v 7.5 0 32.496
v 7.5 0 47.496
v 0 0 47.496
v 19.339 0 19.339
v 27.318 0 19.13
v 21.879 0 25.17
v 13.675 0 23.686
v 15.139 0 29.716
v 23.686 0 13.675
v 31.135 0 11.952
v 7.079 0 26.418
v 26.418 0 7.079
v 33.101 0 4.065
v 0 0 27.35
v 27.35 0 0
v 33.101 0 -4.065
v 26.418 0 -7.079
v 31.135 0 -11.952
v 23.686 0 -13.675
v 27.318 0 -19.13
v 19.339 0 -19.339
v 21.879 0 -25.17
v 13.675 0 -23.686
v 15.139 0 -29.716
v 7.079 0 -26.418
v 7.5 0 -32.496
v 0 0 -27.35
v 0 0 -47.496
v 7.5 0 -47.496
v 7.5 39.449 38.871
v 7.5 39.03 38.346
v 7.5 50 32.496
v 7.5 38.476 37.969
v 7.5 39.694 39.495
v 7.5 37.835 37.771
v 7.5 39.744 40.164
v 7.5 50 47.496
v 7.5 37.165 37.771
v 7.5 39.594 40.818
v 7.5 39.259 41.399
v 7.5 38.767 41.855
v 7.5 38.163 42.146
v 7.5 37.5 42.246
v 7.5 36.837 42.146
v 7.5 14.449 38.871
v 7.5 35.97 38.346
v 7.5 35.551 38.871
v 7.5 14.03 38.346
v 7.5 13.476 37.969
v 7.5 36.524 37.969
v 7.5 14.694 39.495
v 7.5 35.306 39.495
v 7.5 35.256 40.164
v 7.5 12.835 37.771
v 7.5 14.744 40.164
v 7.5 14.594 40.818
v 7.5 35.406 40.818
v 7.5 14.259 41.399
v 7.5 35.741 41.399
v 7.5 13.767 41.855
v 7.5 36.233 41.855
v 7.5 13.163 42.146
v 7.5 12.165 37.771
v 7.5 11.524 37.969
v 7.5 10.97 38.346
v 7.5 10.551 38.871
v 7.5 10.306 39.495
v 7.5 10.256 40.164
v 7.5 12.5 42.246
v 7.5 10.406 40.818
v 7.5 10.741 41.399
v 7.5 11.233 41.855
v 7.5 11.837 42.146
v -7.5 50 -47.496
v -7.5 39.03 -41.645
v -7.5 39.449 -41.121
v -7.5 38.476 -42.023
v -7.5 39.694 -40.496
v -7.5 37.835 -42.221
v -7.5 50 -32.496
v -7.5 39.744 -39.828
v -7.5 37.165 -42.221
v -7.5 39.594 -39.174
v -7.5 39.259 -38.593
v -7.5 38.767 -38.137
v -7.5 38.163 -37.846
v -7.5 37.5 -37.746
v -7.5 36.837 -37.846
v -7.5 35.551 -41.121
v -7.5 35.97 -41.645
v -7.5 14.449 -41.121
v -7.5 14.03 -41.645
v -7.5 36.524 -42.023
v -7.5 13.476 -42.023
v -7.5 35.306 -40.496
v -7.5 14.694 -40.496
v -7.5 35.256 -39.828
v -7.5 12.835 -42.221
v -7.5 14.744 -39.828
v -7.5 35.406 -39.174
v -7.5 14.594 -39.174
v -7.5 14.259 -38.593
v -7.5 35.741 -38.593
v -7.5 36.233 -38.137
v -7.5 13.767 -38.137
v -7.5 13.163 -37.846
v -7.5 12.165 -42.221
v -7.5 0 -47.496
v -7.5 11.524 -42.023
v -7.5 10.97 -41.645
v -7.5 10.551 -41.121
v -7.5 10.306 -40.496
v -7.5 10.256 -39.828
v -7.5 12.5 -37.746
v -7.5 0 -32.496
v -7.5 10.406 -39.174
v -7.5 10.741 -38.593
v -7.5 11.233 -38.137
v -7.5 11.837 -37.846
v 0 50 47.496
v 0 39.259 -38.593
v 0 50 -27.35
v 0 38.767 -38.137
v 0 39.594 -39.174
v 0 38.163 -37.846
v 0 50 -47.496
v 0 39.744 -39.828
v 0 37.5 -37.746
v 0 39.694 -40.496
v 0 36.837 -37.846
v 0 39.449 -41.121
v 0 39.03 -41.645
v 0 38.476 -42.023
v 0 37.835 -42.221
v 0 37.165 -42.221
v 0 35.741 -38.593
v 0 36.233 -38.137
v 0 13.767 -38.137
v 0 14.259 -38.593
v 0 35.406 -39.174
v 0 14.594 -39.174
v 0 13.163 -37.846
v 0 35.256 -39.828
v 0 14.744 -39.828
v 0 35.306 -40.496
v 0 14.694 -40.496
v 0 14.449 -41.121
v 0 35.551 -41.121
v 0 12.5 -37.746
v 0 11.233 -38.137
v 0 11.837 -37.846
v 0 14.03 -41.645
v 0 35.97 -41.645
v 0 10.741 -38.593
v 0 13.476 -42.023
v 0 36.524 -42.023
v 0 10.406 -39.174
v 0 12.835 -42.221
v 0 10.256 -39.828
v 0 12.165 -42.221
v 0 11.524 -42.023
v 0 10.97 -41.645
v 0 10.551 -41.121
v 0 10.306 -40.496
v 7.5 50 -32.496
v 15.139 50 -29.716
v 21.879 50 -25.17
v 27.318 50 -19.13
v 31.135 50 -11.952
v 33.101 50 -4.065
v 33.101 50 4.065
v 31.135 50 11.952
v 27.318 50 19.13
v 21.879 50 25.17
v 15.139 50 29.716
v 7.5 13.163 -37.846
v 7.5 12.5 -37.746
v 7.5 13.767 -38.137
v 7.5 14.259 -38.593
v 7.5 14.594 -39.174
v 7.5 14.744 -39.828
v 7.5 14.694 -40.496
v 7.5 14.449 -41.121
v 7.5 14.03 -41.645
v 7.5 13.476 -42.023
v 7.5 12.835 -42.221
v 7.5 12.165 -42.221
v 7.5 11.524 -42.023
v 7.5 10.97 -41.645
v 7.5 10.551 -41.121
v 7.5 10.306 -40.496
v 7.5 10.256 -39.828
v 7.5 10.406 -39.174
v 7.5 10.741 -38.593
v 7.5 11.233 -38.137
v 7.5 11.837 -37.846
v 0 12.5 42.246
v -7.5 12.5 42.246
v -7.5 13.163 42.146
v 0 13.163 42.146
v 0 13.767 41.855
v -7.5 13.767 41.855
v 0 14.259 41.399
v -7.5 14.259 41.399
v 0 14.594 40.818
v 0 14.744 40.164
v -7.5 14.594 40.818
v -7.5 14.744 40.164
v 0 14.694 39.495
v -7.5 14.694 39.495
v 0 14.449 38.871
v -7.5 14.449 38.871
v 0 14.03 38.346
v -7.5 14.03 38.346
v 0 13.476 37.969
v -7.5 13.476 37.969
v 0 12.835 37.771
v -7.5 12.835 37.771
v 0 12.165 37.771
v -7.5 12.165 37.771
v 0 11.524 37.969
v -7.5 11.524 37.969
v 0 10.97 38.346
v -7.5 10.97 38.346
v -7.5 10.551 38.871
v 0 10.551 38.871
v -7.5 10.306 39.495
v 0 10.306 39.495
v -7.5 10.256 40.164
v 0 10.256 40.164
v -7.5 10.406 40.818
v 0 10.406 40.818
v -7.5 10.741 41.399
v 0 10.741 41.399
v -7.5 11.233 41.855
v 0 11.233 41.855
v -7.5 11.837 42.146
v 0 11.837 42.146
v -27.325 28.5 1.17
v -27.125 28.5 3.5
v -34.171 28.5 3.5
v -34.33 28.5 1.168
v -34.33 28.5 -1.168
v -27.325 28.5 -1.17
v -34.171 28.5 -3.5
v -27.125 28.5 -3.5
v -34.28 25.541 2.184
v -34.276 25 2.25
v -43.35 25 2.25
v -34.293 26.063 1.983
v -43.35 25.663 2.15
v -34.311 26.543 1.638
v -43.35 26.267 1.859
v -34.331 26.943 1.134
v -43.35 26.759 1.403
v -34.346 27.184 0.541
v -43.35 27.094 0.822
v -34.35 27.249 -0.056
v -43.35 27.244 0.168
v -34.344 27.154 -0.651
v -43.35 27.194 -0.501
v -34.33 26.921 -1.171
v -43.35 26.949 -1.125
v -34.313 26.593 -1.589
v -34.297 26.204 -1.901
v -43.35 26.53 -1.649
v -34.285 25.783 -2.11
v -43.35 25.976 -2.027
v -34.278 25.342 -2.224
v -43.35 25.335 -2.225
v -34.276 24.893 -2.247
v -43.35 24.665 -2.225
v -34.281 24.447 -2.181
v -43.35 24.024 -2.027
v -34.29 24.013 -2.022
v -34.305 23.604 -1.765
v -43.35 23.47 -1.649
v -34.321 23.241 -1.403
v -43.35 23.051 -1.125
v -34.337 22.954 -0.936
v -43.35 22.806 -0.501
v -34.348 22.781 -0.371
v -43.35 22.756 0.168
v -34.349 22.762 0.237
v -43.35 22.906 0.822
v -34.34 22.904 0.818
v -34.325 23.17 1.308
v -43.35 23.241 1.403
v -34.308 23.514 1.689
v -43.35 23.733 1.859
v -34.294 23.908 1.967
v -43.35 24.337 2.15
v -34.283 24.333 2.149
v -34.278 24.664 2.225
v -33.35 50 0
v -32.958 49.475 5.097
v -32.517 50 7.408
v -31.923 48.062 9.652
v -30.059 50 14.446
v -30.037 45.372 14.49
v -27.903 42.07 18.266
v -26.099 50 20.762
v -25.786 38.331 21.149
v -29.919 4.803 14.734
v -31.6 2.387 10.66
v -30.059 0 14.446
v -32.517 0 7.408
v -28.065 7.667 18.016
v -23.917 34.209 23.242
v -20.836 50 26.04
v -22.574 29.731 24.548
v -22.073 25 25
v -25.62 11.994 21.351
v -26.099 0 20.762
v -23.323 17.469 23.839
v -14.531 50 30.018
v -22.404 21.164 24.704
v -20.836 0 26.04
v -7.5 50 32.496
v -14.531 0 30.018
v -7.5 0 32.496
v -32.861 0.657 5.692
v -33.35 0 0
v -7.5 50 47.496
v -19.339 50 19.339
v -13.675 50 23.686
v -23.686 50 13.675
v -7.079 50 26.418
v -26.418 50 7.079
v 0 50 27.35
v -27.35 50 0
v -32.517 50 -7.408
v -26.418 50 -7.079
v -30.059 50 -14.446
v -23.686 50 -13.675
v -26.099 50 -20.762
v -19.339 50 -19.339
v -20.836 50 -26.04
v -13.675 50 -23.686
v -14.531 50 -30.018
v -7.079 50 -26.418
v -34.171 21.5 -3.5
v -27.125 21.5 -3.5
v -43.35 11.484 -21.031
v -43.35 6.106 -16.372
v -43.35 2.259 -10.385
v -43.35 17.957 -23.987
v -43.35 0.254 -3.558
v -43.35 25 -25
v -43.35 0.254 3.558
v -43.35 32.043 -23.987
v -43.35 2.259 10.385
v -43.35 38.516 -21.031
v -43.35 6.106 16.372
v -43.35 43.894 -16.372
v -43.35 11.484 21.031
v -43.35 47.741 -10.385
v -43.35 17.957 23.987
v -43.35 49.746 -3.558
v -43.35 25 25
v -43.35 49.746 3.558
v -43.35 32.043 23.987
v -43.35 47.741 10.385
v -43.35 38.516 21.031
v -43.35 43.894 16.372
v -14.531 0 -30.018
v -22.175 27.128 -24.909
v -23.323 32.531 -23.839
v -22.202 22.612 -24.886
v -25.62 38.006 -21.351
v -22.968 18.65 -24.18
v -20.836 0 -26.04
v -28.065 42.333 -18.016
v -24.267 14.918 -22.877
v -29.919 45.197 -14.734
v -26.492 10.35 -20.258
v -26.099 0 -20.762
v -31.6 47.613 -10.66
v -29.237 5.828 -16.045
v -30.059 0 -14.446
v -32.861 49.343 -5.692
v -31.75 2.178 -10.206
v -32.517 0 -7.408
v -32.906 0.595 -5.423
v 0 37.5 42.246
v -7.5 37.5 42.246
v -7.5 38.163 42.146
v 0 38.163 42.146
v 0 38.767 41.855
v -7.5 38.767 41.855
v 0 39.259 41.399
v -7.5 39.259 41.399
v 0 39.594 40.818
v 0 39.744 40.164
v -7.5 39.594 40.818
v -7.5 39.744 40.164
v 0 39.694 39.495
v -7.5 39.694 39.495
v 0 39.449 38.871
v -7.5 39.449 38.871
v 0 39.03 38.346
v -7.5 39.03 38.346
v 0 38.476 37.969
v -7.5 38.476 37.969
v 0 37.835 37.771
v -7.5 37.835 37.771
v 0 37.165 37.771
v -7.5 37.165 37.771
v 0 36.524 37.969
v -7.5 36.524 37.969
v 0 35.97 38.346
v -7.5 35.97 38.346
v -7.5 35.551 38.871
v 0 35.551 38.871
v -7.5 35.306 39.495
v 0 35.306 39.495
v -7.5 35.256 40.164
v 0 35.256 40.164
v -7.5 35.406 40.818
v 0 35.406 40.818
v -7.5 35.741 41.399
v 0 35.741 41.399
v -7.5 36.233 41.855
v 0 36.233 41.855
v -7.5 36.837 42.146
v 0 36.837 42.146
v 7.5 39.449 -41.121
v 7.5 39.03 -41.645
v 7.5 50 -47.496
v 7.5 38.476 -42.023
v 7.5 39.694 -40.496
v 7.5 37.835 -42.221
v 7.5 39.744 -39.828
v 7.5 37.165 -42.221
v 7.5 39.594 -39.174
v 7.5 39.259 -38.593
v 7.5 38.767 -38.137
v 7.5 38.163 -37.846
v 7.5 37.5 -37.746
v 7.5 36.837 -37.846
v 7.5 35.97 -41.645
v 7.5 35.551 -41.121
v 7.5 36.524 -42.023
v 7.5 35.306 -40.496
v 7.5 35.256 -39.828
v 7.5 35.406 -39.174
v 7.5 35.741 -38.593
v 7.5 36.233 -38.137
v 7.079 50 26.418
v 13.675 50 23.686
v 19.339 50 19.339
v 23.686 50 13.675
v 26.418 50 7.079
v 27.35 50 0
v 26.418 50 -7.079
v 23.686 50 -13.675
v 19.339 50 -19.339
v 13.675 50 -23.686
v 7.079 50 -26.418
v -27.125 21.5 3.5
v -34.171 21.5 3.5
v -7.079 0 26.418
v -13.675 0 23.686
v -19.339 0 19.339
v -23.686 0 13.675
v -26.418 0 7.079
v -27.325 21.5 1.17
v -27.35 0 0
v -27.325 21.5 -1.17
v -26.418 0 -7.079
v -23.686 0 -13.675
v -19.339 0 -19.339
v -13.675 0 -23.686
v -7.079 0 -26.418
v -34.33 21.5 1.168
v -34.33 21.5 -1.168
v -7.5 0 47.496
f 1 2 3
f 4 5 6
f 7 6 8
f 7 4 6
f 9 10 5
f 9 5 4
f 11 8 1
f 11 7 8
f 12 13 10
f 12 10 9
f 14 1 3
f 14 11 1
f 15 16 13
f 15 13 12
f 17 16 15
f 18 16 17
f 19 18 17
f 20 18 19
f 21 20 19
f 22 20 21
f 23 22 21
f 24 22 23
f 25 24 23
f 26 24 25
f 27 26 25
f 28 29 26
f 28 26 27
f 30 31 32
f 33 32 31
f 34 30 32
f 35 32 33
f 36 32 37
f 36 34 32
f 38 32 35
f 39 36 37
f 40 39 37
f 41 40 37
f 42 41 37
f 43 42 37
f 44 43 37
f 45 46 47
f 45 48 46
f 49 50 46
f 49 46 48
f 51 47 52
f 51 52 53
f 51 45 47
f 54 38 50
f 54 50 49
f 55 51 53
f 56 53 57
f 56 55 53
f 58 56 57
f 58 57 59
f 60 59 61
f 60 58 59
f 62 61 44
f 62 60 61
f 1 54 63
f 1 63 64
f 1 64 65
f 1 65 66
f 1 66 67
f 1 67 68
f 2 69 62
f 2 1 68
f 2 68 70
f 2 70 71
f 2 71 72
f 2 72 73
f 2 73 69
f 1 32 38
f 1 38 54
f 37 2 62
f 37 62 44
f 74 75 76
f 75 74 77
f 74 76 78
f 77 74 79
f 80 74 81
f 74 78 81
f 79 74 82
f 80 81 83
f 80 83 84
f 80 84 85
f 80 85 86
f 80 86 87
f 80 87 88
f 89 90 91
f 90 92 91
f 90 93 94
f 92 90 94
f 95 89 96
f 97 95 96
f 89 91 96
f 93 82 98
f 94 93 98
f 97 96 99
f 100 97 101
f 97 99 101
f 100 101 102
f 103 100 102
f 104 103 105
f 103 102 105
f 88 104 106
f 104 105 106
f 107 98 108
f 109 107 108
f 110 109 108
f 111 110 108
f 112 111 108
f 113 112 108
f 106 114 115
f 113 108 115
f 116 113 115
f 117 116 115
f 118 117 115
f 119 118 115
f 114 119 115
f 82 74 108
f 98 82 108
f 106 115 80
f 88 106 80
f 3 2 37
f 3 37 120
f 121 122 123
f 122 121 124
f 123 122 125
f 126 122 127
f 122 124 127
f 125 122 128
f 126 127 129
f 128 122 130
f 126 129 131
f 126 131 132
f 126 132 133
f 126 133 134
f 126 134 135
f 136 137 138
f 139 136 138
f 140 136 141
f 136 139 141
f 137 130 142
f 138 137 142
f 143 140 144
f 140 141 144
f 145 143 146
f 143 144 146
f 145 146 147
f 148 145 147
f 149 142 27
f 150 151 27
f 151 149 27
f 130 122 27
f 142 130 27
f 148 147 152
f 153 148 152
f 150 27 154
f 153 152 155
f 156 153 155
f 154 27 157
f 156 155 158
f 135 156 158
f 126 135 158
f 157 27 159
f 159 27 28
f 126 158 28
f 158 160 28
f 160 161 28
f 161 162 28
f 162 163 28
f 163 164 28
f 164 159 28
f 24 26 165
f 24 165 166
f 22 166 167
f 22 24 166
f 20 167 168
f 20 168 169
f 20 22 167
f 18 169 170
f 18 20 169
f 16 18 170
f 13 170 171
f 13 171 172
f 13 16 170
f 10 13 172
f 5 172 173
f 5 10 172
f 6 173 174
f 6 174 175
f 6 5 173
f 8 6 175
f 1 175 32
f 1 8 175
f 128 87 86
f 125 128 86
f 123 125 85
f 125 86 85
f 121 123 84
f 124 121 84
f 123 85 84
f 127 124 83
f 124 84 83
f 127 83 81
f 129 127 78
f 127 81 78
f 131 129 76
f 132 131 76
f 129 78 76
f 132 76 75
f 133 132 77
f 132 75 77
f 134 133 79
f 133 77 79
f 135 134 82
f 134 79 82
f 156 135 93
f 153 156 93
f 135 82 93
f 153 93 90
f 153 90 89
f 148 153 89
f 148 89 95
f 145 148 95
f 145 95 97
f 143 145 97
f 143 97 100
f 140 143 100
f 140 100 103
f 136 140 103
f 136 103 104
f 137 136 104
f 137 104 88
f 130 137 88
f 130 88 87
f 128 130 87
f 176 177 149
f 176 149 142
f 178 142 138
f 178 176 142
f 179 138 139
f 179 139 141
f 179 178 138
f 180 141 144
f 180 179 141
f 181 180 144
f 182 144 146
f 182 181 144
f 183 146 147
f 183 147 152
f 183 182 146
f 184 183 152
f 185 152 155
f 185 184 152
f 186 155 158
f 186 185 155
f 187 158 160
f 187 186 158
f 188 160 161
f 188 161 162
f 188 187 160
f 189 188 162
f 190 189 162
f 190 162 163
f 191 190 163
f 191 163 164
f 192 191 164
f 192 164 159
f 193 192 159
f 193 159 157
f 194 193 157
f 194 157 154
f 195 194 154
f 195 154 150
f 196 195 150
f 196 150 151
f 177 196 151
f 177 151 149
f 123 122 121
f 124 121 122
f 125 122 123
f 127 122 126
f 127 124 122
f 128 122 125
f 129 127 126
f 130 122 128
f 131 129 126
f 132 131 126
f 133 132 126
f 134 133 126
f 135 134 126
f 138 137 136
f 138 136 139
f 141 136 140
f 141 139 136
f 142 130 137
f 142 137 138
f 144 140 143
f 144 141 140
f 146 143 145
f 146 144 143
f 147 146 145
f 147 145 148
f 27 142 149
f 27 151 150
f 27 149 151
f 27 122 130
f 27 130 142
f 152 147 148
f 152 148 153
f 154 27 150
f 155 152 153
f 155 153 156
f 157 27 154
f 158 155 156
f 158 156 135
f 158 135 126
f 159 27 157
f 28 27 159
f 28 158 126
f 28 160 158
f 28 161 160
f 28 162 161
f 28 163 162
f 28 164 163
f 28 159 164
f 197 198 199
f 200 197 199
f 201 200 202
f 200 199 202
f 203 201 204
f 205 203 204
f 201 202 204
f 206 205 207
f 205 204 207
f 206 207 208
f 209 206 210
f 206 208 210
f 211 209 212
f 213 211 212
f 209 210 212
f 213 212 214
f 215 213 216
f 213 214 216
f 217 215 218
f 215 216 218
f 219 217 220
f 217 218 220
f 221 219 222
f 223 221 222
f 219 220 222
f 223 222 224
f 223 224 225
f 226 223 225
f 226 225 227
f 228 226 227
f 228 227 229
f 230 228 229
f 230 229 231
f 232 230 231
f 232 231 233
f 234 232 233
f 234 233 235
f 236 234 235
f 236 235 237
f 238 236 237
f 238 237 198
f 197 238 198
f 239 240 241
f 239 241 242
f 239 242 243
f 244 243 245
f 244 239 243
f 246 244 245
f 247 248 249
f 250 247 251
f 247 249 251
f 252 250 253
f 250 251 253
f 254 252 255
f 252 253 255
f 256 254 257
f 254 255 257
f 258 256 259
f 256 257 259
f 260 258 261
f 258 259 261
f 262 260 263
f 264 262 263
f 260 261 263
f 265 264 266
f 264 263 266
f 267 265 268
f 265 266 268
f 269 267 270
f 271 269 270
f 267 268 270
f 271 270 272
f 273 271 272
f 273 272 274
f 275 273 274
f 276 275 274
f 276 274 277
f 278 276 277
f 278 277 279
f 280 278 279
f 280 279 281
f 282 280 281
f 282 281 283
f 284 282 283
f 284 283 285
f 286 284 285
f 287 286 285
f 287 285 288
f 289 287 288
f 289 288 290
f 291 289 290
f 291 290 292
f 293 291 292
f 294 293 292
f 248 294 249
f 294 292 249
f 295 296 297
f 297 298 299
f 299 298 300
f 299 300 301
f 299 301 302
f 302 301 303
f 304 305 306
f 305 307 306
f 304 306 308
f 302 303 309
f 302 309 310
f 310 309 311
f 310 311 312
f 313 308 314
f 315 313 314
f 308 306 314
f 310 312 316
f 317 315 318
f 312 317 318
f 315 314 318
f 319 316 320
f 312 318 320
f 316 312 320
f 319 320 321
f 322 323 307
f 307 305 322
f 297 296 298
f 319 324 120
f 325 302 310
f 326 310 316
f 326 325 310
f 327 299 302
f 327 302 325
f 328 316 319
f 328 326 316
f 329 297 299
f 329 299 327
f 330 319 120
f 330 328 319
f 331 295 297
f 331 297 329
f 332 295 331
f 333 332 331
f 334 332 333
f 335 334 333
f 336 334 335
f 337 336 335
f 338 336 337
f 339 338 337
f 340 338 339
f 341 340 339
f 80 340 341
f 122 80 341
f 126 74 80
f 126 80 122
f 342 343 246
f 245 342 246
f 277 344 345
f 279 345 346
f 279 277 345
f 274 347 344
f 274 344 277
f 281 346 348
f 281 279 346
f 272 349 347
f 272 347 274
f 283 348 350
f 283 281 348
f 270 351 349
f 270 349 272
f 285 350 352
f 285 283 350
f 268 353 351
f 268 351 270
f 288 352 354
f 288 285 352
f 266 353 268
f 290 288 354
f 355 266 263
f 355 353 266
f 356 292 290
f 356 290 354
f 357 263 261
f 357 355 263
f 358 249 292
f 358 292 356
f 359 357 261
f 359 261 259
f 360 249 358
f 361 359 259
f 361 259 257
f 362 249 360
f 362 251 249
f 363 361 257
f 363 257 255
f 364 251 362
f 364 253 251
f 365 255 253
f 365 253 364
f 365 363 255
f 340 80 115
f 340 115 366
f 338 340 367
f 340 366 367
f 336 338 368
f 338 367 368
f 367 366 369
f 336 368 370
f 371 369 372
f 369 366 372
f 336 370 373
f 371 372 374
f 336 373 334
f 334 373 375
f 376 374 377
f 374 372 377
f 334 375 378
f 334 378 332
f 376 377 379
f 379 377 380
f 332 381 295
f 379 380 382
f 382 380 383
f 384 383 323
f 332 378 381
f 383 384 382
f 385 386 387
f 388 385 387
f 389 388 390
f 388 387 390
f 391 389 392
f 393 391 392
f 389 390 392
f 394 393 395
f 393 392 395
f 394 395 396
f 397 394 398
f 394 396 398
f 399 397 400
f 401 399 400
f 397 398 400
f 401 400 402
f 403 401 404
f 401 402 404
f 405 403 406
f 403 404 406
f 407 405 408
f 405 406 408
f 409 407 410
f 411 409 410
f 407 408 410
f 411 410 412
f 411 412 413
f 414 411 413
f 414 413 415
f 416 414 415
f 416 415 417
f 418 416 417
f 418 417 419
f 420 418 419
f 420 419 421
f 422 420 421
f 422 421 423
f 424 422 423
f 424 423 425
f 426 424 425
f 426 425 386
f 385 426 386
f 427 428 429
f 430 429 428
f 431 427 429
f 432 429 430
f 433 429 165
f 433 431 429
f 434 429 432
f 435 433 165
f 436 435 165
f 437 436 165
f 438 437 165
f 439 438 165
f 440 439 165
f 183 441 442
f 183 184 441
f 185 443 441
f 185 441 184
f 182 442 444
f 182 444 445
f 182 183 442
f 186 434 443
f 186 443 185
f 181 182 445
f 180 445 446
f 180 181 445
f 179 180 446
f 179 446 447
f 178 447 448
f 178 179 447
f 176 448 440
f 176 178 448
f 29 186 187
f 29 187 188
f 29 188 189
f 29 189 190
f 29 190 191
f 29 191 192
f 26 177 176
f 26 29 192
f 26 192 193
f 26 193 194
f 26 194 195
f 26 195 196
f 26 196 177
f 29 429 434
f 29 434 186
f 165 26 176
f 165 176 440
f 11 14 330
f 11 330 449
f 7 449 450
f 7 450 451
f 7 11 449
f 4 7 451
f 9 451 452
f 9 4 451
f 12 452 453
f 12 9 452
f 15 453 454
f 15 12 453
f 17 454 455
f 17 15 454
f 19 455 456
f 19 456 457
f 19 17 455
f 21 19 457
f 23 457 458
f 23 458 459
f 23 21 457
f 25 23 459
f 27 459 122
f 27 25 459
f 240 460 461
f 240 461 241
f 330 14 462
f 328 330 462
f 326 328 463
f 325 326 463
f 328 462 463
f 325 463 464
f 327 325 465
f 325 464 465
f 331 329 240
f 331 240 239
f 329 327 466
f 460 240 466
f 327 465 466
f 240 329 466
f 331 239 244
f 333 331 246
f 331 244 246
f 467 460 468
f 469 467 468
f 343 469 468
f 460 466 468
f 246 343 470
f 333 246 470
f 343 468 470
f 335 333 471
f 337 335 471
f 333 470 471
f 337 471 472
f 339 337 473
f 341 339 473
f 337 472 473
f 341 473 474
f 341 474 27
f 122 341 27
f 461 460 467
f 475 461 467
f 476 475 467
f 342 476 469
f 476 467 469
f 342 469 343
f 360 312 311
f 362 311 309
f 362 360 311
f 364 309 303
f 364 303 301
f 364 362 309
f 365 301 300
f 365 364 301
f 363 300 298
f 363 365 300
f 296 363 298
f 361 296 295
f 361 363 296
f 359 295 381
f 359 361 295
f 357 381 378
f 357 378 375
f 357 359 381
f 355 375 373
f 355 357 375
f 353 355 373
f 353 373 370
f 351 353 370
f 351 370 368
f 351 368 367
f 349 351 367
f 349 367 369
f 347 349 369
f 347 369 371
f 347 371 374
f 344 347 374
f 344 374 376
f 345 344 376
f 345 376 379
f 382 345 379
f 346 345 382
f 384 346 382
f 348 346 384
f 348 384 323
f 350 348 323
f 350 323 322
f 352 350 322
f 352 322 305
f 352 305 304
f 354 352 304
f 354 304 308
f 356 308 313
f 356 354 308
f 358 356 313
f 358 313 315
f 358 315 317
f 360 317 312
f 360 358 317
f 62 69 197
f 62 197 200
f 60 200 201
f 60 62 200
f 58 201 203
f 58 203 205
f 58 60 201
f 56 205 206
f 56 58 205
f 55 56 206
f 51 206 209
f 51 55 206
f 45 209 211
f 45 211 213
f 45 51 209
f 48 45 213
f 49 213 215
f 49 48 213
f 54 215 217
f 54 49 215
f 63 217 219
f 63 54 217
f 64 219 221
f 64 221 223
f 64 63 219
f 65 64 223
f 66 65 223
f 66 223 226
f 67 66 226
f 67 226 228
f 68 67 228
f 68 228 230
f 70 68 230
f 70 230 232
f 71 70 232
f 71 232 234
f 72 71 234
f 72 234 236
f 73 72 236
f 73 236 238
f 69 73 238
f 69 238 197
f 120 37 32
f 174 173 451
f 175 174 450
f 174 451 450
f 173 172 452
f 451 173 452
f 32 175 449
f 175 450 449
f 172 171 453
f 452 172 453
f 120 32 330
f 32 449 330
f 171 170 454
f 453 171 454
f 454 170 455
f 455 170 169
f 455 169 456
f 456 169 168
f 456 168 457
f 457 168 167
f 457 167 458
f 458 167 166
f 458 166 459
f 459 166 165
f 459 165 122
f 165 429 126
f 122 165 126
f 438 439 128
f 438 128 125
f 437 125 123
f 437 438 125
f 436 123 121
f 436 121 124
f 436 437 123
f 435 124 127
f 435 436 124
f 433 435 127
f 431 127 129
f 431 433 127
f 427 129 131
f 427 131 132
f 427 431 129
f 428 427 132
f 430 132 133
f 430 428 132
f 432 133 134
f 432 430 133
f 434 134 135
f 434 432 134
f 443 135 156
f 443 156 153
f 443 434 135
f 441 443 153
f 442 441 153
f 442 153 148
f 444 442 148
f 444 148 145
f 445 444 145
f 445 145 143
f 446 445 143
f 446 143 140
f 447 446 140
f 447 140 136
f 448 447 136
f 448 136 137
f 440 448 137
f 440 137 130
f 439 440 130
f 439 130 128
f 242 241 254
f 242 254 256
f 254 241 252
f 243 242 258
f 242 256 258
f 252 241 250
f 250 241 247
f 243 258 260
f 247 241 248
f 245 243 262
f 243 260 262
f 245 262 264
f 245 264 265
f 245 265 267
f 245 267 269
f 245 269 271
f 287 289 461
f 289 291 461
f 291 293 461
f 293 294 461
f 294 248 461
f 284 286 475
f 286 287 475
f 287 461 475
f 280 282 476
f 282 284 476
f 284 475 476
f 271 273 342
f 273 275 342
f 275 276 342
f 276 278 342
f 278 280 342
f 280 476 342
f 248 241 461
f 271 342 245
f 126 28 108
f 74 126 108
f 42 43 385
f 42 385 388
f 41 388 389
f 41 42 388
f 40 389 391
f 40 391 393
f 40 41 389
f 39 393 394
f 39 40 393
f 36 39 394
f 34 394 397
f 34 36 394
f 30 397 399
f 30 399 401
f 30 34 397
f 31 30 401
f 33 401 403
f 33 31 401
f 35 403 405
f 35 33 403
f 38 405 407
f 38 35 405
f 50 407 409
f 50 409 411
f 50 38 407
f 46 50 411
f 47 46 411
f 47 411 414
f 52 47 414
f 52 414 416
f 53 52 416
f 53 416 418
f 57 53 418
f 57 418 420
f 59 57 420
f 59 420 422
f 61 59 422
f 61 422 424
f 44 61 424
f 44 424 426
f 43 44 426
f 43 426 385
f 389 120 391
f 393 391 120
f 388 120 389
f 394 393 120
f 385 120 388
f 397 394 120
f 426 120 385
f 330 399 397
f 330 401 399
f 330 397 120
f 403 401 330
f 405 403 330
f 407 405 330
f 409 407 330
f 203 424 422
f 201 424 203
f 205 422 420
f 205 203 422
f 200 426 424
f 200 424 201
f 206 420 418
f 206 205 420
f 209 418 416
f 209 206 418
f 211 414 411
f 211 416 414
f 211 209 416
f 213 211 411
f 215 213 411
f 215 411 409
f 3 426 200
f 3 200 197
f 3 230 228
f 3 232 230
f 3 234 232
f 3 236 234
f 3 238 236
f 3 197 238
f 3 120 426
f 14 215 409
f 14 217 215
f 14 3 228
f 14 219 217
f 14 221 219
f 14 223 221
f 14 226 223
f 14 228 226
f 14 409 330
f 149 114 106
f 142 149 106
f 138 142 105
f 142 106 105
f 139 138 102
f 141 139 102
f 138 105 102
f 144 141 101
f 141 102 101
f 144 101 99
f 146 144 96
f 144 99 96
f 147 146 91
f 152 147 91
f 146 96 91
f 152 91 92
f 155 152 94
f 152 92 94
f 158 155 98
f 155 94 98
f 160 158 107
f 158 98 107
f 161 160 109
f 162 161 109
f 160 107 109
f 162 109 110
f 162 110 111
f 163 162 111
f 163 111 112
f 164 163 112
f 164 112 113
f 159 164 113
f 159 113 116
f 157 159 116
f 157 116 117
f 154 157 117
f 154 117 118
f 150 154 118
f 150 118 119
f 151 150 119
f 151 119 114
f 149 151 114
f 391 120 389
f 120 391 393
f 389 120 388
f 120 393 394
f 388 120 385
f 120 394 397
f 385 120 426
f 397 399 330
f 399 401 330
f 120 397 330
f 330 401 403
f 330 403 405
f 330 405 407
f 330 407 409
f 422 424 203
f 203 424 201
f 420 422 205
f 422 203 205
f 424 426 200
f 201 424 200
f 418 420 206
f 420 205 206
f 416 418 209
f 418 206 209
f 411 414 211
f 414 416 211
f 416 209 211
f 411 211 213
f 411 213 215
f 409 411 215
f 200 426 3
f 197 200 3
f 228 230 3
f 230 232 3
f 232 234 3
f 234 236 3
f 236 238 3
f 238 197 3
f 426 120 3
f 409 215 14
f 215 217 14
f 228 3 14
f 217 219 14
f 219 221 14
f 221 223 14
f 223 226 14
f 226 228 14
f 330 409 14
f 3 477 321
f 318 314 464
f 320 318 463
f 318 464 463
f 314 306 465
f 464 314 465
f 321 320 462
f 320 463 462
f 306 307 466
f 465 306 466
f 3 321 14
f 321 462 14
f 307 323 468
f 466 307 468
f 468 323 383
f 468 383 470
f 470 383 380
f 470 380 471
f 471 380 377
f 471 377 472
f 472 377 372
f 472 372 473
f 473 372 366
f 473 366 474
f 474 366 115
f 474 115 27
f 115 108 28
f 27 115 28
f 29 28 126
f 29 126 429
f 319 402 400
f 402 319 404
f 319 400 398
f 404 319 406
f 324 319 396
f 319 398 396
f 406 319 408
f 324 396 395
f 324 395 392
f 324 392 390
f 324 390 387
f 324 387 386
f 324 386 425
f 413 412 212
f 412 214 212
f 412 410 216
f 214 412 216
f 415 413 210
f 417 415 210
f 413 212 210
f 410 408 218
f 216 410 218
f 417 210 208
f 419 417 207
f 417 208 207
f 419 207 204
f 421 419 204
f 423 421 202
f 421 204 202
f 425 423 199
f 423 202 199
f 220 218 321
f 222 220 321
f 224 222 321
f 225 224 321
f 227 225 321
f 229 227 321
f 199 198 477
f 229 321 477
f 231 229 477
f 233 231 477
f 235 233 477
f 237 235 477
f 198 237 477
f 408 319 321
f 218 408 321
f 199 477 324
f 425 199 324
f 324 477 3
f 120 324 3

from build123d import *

# Parameters (mm, degrees)
MAIN_BODY_DEPTH          = 50
SKETCH6_R                = 2.25
CUT_EXTRUDE3_DEPTH       = 74.648264845
BOSS_EXTRUDE2_REACH      = 105.144
BOSS_EXTRUDE2_END_RADIUS = 33.35
SKETCH4_R                = 25
SKETCH5_R                = 2.25
CUT_EXTRUDE2_DEPTH       = 104.14424087
CUT_EXTRUDE5_REACH       = 83.456
CUT_EXTRUDE5_END_RADIUS  = 34.35
SKETCH7_W                = 7
SKETCH7_H                = 7


with BuildPart() as part:
    # Sketch2 → main body (new body)
    with BuildSketch(Plane(origin=(0, 0, 0), x_dir=(1, 0, 0), z_dir=(0, 1, 0))):
        with BuildLine():
            Line((0, 27.35), (0, 47.495730489))
            Line((0, 47.495730489), (-7.5, 47.495730489))
            Line((-7.5, 47.495730489), (-7.5, 32.495730489))
            ThreePointArc((-7.5, 32.495730489), (-33.35, 0), (-7.5, -32.495730489))
            Line((-7.5, -32.495730489), (-7.5, -47.495730489))
            Line((-7.5, -47.495730489), (0, -47.495730489))
            Line((0, -47.495730489), (0, -27.35))
            ThreePointArc((0, -27.35), (-27.35, 0), (0, 27.35))
        make_face()
    extrude(amount=MAIN_BODY_DEPTH)

    # Sketch6 → Cut-Extrude3 (cut, through all)
    with BuildSketch(Plane.ZY.offset(7.5)):
        with Locations((-39.995730489, 37.5)):
            Circle(SKETCH6_R)
        with Locations((-39.995730489, 12.5)):
            Circle(SKETCH6_R)
        with Locations((39.995730489, 37.5)):
            Circle(SKETCH6_R)
        with Locations((39.995730489, 12.5)):
            Circle(SKETCH6_R)
    extrude(amount=-CUT_EXTRUDE3_DEPTH, mode=Mode.SUBTRACT)


with BuildPart() as body_2:
    # Mirror2: mirrored copy
    add(part.part.mirror(Plane(origin=(0, 50, -27.35), x_dir=(0, 0, 1), z_dir=(-1, 0, 0))))


with BuildPart() as part_1:
    add(part.part)

    # Boss-Extrude2: up to this cylinder (the profile starts outside it)
    boss_extrude2_end = Plane(origin=(0, 25, 0), z_dir=(0, -1, 0)) * Cylinder(BOSS_EXTRUDE2_END_RADIUS, 277.988, mode=Mode.PRIVATE)
    # Sketch4 → Boss-Extrude2 (add, up to the surface)
    with BuildSketch(Plane.ZY.offset(43.35), mode=Mode.PRIVATE) as boss_extrude2_sk1:
        with Locations((0, 25)):
            Circle(SKETCH4_R)
    boss_extrude2_tool1 = extrude(boss_extrude2_sk1.sketch, amount=-BOSS_EXTRUDE2_REACH, mode=Mode.PRIVATE) - boss_extrude2_end
    add(boss_extrude2_tool1.solids().sort_by_distance((-43.35, 25, 0))[0])

    # Sketch5 → Cut-Extrude2 (cut, through all)
    with BuildSketch(Plane.ZY.offset(43.35)):
        with Locations((0, 25)):
            Circle(SKETCH5_R)
    extrude(amount=-CUT_EXTRUDE2_DEPTH, mode=Mode.SUBTRACT)

    # Cut-Extrude5: up to this cylinder (the profile starts inside it)
    cut_extrude5_end = Plane(origin=(0, 25, 0), z_dir=(0, -1, 0)) * Cylinder(CUT_EXTRUDE5_END_RADIUS, 236.612, mode=Mode.PRIVATE)
    # Sketch7 → Cut-Extrude5 (cut, up to the surface)
    with BuildSketch(Plane(origin=(0, 0, 0), x_dir=(0, 0, -1), z_dir=(1, 0, 0)), mode=Mode.PRIVATE) as cut_extrude5_sk1:
        with Locations((0, 25)):
            Rectangle(SKETCH7_W, SKETCH7_H)
    cut_extrude5_tool1 = extrude(cut_extrude5_sk1.sketch, amount=-CUT_EXTRUDE5_REACH, mode=Mode.PRIVATE) & cut_extrude5_end
    add(cut_extrude5_tool1.solids().sort_by_distance((0, 25, 0))[0], mode=Mode.SUBTRACT)


solid = Compound([body_2.part, part_1.part])
